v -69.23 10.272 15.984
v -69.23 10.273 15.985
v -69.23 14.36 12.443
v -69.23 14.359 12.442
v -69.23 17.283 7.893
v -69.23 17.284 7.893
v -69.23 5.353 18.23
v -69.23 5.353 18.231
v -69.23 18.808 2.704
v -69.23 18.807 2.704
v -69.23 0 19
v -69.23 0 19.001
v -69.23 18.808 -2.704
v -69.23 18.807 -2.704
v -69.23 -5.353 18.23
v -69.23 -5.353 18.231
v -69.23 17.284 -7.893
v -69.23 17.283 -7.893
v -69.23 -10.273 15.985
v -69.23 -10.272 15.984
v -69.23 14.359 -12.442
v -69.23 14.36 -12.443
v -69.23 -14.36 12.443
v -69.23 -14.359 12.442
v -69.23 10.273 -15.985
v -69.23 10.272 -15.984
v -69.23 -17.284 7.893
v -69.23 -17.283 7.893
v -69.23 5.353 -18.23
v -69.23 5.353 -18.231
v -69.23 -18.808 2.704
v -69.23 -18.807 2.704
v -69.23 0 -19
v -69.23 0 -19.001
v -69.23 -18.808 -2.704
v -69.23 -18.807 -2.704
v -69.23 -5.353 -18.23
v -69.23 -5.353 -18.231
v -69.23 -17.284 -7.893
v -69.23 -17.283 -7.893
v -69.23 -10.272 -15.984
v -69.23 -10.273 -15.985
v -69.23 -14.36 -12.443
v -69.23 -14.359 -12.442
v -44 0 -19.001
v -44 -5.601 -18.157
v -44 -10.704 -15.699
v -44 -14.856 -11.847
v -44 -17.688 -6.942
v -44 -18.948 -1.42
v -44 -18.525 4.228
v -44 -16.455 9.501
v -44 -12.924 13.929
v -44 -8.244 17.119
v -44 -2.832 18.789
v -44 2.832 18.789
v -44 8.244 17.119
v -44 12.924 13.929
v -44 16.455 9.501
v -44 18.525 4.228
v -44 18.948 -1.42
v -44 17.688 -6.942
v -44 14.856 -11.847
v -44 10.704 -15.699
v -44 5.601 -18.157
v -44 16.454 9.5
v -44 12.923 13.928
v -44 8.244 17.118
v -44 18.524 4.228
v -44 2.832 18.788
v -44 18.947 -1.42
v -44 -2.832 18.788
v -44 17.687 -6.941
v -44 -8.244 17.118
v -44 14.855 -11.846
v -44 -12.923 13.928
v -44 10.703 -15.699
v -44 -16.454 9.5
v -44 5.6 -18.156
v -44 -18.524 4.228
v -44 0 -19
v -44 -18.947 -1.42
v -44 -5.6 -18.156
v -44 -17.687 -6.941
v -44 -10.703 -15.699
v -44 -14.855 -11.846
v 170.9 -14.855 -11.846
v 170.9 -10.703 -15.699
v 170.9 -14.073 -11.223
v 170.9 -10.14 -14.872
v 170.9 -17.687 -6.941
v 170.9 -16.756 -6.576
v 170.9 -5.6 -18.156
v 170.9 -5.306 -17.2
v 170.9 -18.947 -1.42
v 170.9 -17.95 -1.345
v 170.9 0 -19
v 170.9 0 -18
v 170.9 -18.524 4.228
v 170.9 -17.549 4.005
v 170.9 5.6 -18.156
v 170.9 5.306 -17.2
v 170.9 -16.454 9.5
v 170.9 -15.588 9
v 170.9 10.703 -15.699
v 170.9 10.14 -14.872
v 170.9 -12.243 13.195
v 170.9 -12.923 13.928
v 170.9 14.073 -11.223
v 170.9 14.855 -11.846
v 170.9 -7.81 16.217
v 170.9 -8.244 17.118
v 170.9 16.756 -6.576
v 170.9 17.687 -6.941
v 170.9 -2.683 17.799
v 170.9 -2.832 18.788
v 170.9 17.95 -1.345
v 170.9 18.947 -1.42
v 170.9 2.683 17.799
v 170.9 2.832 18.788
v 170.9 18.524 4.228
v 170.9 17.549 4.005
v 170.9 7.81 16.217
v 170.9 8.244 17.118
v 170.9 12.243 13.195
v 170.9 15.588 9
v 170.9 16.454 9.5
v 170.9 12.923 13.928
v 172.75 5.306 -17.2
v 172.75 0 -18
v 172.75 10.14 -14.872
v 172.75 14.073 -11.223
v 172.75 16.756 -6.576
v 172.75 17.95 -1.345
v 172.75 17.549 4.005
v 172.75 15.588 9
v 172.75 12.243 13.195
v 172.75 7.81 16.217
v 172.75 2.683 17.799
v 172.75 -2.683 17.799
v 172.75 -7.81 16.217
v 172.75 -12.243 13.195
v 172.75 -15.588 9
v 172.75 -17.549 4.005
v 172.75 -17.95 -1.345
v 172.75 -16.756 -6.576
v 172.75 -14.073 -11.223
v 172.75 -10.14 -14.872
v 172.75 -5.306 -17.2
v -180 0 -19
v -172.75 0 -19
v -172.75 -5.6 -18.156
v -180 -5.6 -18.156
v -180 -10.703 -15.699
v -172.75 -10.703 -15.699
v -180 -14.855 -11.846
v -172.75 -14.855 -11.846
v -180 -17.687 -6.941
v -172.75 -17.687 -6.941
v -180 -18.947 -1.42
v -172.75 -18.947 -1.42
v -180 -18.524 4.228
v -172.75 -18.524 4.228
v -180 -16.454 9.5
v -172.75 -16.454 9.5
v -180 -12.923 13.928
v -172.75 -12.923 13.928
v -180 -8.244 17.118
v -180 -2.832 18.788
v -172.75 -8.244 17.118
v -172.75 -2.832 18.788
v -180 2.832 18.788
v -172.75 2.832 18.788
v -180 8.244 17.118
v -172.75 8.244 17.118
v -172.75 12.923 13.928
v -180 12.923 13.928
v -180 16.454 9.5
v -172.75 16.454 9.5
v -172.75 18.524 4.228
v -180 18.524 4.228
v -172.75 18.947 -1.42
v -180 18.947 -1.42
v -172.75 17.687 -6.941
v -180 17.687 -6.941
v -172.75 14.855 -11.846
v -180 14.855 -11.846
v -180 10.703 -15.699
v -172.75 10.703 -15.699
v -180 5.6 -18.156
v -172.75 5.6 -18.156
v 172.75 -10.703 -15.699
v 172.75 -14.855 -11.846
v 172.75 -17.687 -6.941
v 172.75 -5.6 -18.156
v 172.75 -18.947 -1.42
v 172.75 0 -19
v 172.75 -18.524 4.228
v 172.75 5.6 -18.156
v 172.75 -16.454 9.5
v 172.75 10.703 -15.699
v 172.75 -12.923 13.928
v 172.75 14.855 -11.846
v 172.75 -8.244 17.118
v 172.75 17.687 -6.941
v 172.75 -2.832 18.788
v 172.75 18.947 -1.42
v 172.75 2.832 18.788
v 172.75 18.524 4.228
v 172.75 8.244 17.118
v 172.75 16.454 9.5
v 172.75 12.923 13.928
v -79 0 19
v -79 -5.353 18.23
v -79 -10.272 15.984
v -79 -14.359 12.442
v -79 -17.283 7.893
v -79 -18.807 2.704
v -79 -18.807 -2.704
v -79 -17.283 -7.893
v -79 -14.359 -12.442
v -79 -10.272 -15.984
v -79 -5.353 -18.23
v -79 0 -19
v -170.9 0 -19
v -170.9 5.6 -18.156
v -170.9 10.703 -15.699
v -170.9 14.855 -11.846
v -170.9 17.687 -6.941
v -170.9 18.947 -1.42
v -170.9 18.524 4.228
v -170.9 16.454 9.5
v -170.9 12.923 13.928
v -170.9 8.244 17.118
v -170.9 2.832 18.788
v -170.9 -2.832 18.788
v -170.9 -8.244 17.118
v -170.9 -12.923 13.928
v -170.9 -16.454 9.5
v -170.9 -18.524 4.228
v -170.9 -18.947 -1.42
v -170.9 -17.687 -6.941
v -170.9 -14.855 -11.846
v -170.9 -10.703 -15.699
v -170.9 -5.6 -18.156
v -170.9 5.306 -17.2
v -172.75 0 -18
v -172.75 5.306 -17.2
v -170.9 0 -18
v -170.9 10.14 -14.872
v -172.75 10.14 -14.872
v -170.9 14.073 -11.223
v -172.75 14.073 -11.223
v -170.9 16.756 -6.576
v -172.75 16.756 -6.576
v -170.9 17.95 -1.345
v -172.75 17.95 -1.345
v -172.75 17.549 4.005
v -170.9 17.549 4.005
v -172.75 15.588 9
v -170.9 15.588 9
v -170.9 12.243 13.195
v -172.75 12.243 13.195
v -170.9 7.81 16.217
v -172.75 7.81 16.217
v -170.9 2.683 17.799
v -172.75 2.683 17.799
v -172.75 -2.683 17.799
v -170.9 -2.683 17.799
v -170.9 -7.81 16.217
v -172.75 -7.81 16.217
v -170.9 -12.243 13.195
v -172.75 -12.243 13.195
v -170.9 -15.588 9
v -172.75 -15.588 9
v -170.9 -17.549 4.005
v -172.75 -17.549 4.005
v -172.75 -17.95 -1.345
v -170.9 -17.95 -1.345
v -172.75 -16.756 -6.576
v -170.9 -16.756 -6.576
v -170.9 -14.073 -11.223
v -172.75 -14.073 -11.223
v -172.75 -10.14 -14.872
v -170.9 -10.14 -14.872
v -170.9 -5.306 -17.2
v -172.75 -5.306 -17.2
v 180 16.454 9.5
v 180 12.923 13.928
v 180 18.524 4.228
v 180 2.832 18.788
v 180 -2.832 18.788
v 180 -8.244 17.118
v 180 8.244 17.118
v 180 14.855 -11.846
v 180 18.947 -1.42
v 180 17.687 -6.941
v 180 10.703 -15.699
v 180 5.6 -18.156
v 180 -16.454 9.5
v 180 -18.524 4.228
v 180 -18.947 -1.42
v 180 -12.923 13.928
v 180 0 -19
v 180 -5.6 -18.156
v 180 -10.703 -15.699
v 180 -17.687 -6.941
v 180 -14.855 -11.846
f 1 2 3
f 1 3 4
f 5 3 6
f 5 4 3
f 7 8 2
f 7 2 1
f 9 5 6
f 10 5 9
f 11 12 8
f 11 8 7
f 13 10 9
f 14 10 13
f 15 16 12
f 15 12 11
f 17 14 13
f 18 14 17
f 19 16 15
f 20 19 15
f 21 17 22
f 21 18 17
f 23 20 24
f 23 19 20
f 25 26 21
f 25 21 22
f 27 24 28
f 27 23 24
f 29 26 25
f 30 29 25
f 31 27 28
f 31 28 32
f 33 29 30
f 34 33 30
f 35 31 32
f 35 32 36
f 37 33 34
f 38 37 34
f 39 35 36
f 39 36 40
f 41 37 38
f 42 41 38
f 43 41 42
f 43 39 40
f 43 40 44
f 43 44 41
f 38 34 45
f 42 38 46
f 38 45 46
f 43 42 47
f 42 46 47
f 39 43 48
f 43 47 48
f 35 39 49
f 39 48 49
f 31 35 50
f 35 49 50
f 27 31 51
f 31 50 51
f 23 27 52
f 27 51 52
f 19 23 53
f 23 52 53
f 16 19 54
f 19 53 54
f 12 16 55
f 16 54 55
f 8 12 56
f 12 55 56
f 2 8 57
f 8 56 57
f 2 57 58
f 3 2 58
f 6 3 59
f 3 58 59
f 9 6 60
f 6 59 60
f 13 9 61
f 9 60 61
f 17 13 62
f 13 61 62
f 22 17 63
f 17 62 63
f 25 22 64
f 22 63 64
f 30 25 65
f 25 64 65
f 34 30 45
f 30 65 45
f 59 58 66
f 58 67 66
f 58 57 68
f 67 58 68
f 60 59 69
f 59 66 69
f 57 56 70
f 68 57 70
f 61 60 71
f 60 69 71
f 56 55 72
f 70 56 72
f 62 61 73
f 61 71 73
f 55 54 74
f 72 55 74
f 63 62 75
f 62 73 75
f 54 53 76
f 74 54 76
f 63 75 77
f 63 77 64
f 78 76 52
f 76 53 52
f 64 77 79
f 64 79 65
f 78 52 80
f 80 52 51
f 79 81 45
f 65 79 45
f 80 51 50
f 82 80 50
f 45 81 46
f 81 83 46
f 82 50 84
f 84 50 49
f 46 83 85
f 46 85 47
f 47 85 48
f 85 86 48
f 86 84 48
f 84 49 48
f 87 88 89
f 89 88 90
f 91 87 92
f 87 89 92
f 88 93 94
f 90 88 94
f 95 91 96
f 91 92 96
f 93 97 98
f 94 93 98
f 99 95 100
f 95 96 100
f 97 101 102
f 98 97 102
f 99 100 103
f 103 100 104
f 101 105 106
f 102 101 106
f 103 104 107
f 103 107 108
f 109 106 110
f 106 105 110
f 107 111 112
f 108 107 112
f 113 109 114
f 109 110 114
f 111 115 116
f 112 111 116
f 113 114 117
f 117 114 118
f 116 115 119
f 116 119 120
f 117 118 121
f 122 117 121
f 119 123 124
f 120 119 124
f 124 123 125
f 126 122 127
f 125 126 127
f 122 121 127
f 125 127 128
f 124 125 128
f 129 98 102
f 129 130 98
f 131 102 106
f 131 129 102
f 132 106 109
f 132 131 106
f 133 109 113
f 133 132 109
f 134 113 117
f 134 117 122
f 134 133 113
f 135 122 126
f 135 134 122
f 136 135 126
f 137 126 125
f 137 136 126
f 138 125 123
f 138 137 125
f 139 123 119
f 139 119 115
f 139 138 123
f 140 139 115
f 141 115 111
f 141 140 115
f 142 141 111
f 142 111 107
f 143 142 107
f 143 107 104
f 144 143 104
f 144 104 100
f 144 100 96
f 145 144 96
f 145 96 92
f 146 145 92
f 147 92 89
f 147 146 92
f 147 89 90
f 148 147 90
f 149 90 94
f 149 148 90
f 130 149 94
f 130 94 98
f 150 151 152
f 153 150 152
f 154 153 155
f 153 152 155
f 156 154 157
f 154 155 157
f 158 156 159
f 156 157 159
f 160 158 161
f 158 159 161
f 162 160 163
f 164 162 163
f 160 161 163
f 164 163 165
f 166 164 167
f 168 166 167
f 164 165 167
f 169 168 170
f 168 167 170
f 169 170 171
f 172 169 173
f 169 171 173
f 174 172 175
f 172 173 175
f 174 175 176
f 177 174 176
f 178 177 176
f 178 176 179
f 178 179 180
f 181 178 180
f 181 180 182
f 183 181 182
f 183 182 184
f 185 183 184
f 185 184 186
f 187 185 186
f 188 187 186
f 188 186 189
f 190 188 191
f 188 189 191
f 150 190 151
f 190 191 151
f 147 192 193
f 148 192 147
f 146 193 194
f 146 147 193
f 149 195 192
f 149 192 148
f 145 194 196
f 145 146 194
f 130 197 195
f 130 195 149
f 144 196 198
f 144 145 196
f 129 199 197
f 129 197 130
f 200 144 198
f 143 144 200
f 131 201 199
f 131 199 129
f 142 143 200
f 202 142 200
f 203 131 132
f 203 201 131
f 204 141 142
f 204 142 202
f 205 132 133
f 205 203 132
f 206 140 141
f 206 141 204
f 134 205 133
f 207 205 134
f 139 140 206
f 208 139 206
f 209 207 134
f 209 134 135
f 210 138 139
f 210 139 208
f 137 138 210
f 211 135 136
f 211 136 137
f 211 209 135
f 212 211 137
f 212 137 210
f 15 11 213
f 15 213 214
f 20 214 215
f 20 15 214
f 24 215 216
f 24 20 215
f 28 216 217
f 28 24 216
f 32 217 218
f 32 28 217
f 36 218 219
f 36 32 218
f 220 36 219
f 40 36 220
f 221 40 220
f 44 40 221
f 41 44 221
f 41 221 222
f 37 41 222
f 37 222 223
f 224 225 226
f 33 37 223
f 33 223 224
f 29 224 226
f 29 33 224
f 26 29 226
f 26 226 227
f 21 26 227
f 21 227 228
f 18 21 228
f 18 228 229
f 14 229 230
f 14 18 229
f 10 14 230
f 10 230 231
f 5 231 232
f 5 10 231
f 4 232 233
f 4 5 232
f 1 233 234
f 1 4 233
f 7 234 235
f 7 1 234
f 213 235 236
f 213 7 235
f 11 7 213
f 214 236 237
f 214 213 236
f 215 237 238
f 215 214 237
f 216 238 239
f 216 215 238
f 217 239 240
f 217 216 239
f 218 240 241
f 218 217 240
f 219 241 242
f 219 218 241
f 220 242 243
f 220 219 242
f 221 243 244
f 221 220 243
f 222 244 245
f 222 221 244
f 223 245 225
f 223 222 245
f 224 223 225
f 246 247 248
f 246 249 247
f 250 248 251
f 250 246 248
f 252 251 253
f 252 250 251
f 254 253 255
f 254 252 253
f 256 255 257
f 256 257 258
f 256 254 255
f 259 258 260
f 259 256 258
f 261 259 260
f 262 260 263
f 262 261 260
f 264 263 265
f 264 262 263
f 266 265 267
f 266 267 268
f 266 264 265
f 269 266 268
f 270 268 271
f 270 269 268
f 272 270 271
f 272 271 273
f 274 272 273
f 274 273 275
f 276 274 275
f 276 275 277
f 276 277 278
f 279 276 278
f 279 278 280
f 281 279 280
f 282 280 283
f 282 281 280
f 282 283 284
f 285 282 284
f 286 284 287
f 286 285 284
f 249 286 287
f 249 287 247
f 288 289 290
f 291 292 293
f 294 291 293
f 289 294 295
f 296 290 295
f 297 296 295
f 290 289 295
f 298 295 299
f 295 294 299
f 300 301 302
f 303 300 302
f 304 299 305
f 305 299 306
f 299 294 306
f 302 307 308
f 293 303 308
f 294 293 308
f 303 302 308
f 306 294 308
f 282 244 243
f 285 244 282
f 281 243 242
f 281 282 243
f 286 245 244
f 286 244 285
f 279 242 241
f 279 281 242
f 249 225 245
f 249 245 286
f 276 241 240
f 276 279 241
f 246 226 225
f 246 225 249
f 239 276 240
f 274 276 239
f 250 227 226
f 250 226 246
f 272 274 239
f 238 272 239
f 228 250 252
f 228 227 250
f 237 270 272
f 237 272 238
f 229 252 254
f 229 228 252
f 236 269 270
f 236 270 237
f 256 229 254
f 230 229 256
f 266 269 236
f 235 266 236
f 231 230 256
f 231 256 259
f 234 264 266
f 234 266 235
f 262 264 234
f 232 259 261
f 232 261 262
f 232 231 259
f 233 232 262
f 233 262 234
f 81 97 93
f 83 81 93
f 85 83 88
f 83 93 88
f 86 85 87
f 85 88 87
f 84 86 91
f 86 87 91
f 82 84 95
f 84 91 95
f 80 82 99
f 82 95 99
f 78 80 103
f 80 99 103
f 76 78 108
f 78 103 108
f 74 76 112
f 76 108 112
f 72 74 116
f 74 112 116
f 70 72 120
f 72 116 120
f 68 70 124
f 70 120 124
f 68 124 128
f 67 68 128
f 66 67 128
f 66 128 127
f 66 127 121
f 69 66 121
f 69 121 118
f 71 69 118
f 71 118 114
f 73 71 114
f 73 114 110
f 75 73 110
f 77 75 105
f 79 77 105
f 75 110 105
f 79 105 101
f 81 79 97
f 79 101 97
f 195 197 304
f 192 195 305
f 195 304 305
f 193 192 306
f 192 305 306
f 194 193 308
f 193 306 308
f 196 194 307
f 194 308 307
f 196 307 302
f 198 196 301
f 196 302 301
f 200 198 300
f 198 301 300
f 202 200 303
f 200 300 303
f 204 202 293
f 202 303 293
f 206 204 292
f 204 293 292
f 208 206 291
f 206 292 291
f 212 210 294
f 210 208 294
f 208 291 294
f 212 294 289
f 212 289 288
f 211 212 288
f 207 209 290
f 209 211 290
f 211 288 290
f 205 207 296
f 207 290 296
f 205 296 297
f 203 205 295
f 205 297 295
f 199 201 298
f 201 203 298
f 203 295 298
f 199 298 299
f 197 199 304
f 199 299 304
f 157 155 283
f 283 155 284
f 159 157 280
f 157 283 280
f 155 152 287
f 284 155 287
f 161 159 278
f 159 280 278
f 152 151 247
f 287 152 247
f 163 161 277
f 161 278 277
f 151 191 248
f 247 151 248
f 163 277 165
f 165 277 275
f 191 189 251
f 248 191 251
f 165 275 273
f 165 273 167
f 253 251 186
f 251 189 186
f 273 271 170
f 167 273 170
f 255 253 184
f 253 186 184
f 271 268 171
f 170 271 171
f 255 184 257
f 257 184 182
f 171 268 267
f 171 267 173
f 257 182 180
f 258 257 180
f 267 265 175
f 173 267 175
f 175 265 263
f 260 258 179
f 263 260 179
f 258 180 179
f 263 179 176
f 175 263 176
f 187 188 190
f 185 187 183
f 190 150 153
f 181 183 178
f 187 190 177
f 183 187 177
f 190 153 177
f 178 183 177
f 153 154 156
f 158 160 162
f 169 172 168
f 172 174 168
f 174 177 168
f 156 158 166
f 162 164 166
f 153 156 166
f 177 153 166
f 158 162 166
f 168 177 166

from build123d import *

# Parameters (mm, degrees)
SKIZZE19_W = 1.85
SKIZZE19_H = 1
SKIZZE20_W = 1.85
SKIZZE20_H = 1
SKETCH1_W  = 14.101371306
SKETCH1_H  = 11.293421516


with BuildPart() as part:
    # Skizze1 → Rotation1 (revolve)
    with BuildSketch(Plane.XY, mode=Mode.PRIVATE) as rotation1_sk:
        Polygon((180, 19), (180, 0), (-180, 0), (-180, 19), (-79, 19), (-79, 27), (-74, 27), (-74, 19.001), (-44, 19.001), (-44, 19), align=None)
    revolve(rotation1_sk.sketch.rotate(Axis((180, 0, 0), (-1, 0, 0)), 90), axis=Axis((180, 0, 0), (-1, 0, 0)))

    # Skizze19 → Schnitt-Rotation1 (revolve, cut)
    with BuildSketch(Plane.XY, mode=Mode.PRIVATE) as schnitt_rotation1_sk:
        with Locations((171.825, 18.5)):
            Rectangle(SKIZZE19_W, SKIZZE19_H)
    revolve(schnitt_rotation1_sk.sketch.rotate(Axis((-88.99, 0, 0), (1, 0, 0)), 270), axis=Axis((-88.99, 0, 0), (1, 0, 0)), mode=Mode.SUBTRACT)

    # Skizze20 → Schnitt-Rotation2 (revolve, cut)
    with BuildSketch(Plane.XY, mode=Mode.PRIVATE) as schnitt_rotation2_sk:
        with Locations((-171.825, 18.5)):
            Rectangle(SKIZZE20_W, SKIZZE20_H)
    revolve(schnitt_rotation2_sk.sketch.rotate(Axis((-88.99, 0, 0), (1, 0, 0)), 270), axis=Axis((-88.99, 0, 0), (1, 0, 0)), mode=Mode.SUBTRACT)

    # Sketch1 → Cut-Revolve1 (revolve, cut)
    with BuildSketch(Plane.XY, mode=Mode.PRIVATE) as cut_revolve1_sk:
        with Locations((-76.280304753, 24.646710758)):
            Rectangle(SKETCH1_W, SKETCH1_H)
    revolve(cut_revolve1_sk.sketch.rotate(Axis((-191.164691911, 0, 0), (1, 0, 0)), 90), axis=Axis((-191.164691911, 0, 0), (1, 0, 0)), mode=Mode.SUBTRACT)


solid = part.part
